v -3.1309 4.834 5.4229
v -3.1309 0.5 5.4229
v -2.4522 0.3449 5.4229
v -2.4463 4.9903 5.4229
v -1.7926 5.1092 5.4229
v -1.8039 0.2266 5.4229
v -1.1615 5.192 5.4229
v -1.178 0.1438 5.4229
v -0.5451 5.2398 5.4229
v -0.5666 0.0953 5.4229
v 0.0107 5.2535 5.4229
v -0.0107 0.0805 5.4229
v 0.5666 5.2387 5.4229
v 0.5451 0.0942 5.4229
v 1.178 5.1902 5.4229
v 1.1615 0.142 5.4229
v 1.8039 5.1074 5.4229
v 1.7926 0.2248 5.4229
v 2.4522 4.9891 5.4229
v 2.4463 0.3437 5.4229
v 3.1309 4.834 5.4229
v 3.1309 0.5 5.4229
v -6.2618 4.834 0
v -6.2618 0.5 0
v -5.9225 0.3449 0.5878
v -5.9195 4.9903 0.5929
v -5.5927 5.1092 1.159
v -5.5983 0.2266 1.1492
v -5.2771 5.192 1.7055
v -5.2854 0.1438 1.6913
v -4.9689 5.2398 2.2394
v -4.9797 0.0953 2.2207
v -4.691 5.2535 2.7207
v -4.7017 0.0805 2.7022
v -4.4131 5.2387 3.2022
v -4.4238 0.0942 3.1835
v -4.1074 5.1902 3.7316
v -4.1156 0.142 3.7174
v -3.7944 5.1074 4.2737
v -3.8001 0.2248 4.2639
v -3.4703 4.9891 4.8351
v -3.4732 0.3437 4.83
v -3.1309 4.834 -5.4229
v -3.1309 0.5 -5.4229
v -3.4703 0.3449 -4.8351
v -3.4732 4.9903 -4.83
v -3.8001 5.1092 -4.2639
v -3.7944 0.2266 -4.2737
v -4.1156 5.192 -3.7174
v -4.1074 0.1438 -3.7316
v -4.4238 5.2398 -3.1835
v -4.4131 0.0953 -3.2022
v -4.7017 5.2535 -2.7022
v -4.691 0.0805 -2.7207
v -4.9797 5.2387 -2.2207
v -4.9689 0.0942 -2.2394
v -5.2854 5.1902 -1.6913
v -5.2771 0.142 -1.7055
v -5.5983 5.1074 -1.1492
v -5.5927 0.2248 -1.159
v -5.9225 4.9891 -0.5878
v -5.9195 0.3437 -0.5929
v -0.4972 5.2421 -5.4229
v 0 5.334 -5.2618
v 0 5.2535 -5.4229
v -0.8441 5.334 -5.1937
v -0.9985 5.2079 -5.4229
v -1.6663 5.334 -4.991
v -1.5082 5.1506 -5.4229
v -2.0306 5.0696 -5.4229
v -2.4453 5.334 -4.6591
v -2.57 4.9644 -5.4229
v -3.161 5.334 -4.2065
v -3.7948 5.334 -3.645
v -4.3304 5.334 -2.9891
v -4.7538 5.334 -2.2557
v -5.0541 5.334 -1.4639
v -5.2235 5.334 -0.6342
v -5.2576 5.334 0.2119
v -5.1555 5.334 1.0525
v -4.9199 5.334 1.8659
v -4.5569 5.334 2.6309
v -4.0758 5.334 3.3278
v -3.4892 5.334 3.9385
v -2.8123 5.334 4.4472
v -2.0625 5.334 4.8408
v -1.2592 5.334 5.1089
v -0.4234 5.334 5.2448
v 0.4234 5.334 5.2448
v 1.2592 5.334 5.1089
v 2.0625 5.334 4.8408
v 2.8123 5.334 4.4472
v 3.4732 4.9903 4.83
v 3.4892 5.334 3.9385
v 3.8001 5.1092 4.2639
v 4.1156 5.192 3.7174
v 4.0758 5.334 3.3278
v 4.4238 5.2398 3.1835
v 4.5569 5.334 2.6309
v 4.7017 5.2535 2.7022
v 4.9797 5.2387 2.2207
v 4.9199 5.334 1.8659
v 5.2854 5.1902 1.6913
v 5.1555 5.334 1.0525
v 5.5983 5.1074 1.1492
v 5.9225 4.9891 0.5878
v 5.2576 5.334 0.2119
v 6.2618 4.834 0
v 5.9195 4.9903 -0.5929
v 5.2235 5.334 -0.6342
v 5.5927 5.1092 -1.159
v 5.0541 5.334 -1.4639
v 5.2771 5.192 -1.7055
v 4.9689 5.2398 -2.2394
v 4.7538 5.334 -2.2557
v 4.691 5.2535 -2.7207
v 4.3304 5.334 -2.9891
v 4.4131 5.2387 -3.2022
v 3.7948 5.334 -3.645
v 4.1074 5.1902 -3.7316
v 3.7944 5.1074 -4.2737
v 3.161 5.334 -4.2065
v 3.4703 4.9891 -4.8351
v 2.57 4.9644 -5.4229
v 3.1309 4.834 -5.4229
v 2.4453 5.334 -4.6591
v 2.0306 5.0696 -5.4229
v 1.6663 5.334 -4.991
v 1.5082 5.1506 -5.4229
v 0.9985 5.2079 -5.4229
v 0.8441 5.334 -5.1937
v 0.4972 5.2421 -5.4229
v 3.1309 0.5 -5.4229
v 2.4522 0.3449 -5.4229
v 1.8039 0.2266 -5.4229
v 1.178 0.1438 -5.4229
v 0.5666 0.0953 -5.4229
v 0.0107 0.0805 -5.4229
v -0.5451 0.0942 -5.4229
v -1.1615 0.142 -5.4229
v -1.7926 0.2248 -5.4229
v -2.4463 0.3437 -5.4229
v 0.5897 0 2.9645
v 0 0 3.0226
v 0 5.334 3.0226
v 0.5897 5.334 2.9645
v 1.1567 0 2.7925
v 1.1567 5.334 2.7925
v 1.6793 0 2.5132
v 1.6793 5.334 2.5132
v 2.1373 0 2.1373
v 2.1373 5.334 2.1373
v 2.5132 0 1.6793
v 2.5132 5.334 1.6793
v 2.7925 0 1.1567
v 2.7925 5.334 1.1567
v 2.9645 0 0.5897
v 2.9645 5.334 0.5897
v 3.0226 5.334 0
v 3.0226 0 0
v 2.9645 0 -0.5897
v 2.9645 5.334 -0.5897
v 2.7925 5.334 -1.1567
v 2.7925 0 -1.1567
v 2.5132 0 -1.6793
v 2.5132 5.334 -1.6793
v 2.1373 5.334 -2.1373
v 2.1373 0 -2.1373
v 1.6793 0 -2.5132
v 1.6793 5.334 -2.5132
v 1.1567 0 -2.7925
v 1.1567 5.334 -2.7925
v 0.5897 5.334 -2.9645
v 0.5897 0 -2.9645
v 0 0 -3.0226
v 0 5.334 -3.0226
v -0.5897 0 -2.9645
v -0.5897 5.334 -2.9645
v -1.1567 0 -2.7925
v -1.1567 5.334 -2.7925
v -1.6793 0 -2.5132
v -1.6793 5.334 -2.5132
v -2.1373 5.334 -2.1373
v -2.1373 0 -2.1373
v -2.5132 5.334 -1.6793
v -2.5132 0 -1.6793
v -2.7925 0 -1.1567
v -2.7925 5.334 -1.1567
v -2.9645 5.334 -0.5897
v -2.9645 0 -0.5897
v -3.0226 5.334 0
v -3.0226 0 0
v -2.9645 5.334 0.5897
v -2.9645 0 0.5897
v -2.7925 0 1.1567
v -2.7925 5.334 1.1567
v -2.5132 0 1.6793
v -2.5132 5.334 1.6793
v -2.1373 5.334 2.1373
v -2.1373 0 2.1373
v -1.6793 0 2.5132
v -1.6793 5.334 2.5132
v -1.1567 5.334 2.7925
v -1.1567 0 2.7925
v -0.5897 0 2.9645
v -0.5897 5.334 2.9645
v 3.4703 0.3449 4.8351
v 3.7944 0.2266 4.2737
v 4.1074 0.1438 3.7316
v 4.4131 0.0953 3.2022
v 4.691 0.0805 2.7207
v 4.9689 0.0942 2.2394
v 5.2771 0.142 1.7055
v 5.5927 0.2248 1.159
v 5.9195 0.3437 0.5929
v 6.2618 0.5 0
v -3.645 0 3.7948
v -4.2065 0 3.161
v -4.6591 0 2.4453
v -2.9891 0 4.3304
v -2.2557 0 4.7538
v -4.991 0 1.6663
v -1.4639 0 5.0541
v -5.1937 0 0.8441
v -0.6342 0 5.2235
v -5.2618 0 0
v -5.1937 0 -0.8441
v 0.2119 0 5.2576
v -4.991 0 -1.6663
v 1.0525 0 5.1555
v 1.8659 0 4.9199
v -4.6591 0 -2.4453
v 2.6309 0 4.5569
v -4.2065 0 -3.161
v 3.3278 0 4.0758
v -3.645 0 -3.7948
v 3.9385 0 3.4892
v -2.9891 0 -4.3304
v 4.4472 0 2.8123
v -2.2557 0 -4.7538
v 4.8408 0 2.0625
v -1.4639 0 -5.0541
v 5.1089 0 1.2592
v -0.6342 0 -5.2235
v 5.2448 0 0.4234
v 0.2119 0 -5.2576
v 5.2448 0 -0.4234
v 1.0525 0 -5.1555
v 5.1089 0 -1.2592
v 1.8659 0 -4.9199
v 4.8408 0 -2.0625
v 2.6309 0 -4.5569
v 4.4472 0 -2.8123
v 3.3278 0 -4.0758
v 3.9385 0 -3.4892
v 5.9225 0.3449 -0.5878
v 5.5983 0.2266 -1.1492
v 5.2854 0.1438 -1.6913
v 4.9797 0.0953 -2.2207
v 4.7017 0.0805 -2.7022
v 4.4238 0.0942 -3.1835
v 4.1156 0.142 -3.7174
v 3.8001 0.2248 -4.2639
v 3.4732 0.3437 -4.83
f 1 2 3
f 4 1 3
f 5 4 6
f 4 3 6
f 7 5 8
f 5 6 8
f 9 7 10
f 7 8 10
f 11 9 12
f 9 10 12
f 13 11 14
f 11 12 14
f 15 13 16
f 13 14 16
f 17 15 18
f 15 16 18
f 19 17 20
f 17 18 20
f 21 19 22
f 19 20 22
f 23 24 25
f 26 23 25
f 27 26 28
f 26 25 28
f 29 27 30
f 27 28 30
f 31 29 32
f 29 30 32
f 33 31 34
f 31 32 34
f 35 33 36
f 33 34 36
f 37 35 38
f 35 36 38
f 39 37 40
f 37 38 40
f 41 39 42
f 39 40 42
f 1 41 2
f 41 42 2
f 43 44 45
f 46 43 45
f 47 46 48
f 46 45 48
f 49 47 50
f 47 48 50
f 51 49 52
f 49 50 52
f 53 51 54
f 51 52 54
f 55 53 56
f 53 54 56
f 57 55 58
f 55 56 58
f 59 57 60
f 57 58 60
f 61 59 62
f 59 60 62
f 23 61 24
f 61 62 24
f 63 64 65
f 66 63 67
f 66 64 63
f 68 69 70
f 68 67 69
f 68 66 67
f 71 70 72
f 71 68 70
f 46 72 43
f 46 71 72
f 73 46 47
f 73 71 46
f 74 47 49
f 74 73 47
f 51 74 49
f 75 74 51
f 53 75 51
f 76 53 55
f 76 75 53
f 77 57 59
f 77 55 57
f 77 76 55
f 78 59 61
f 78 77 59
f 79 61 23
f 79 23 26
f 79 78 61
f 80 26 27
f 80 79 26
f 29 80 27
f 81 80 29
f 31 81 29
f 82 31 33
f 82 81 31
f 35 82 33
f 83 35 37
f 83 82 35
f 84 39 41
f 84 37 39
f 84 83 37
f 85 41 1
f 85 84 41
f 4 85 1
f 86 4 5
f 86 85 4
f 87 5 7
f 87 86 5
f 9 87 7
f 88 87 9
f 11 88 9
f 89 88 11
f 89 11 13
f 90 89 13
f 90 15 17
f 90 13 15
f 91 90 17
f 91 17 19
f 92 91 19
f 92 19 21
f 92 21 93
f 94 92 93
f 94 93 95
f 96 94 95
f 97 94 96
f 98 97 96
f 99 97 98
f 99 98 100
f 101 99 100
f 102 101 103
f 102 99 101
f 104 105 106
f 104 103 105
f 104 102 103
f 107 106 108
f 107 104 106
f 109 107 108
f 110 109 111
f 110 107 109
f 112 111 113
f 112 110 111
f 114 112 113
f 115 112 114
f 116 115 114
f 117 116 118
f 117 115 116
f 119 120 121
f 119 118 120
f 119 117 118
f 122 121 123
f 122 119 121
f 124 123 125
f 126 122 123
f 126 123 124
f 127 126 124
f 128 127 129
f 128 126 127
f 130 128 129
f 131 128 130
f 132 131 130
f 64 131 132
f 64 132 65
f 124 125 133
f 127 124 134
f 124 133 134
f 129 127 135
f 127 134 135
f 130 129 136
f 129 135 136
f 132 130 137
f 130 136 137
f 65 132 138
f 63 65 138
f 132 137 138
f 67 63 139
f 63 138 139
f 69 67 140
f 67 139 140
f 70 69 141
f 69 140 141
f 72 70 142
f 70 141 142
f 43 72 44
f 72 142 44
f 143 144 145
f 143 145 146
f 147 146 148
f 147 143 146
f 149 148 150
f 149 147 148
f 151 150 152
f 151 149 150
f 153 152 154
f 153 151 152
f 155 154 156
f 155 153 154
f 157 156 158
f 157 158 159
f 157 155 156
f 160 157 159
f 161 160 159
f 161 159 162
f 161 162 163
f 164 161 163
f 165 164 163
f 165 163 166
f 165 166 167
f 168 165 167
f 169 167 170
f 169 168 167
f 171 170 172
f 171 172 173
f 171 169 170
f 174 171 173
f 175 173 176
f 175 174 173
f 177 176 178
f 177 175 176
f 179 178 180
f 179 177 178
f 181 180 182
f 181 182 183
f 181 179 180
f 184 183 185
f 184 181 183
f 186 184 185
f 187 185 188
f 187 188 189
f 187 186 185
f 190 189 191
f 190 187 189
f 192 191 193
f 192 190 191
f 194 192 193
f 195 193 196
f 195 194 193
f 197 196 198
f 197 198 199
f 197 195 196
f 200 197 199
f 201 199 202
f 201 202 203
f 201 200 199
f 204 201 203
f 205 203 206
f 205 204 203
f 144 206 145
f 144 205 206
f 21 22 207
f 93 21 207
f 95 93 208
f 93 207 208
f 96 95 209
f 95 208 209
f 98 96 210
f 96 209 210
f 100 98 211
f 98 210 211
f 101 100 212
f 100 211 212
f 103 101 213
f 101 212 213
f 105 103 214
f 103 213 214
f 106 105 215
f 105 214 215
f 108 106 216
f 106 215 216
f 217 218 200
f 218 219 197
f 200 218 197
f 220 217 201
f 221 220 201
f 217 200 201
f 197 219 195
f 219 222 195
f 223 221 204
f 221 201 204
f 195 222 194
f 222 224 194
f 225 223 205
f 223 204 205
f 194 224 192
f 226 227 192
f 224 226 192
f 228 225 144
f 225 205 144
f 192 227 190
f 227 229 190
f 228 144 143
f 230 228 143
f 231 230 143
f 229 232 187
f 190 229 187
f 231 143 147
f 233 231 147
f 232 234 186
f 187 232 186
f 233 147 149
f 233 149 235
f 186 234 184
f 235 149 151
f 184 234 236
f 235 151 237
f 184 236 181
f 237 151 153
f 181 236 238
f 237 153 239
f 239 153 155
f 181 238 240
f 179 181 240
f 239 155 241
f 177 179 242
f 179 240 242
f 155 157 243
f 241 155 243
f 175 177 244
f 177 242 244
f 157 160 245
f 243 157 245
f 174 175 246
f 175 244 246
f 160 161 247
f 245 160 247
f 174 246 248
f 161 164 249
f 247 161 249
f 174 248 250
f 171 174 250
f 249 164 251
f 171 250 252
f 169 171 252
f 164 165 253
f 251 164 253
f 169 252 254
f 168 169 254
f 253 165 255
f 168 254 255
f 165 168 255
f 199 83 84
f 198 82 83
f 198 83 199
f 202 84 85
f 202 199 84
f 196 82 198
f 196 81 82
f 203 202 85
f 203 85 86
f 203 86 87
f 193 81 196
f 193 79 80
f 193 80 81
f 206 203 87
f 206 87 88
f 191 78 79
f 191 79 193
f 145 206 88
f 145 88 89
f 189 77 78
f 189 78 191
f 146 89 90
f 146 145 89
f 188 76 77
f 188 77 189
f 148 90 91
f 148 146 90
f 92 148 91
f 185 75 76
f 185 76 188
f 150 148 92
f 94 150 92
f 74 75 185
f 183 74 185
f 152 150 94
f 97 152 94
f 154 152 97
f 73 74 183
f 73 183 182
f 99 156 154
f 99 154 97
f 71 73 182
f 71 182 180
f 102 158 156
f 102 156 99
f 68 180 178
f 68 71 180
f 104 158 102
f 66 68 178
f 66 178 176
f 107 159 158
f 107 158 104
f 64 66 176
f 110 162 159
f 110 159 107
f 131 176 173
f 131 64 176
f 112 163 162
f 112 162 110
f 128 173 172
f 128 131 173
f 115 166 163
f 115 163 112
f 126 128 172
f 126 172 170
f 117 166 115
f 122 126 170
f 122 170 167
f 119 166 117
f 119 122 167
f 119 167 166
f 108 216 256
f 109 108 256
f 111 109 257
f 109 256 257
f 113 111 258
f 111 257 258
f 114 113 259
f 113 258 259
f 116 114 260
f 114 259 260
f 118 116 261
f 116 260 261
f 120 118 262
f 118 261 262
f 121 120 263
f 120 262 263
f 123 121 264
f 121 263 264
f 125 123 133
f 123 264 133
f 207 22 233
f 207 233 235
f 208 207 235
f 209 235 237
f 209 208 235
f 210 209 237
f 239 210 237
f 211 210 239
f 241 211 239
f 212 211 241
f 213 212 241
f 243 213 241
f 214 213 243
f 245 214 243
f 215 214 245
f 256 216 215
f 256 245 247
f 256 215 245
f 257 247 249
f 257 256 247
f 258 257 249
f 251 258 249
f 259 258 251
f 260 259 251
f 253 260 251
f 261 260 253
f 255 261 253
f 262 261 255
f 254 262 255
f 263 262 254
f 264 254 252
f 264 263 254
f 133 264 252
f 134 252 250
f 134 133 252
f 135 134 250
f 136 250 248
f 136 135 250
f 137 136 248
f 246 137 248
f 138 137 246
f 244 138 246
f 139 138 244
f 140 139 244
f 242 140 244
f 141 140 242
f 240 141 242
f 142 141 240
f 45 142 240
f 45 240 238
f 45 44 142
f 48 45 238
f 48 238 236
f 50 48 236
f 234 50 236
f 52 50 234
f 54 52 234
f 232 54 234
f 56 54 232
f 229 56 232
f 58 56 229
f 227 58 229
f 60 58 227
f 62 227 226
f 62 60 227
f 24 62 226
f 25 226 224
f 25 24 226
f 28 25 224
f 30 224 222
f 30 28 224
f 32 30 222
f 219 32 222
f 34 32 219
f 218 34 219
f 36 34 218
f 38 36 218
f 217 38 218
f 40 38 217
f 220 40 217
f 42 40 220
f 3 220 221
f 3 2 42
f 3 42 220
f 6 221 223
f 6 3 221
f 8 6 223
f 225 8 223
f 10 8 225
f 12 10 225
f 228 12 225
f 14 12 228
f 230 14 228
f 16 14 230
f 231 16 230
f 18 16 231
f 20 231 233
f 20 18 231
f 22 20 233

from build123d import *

# Parameters (mm, degrees)
CROQUIS1_R              = 3.0226
SALIENTE_EXTRUIR1_DEPTH = 5.334


with BuildPart() as part:
    # Croquis1 → Saliente-Extruir1 (new body)
    with BuildSketch(Plane(origin=(0, 0, 0), x_dir=(1, 0, 0), z_dir=(0, 1, 0))):
        Polygon((-6.26182555, 0), (-3.130912775, -5.4229), (3.130912775, -5.4229), (6.26182555, 0), (3.130912775, 5.4229), (-3.130912775, 5.4229), align=None)
        with Locations(Location((0, 0, 0), (0, 0, 270))):
            Circle(CROQUIS1_R, mode=Mode.SUBTRACT)
    extrude(amount=SALIENTE_EXTRUIR1_DEPTH)

    # Croquis2 → Cortar-Revolución1 (revolve, cut)
    with BuildSketch(Plane.XY, mode=Mode.PRIVATE) as cortar_revoluci_n1_sk:
        Polygon((-6.26182555, 5.334), (-6.26182555, 4.834), (-5.26182555, 5.334), align=None)
    revolve(cortar_revoluci_n1_sk.sketch.rotate(Axis((0, 0, 0), (0, 1, 0)), 270), axis=Axis((0, 0, 0), (0, 1, 0)), mode=Mode.SUBTRACT)

    # Croquis3 → Cortar-Revolución3 (revolve, cut)
    with BuildSketch(Plane.XY, mode=Mode.PRIVATE) as cortar_revoluci_n3_sk:
        Polygon((-6.26182555, 0), (-5.26182555, 0), (-6.26182555, 0.5), align=None)
    revolve(cortar_revoluci_n3_sk.sketch.rotate(Axis((0, 0, 0), (0, 1, 0)), 120.000000008), axis=Axis((0, 0, 0), (0, 1, 0)), mode=Mode.SUBTRACT)


solid = part.part
